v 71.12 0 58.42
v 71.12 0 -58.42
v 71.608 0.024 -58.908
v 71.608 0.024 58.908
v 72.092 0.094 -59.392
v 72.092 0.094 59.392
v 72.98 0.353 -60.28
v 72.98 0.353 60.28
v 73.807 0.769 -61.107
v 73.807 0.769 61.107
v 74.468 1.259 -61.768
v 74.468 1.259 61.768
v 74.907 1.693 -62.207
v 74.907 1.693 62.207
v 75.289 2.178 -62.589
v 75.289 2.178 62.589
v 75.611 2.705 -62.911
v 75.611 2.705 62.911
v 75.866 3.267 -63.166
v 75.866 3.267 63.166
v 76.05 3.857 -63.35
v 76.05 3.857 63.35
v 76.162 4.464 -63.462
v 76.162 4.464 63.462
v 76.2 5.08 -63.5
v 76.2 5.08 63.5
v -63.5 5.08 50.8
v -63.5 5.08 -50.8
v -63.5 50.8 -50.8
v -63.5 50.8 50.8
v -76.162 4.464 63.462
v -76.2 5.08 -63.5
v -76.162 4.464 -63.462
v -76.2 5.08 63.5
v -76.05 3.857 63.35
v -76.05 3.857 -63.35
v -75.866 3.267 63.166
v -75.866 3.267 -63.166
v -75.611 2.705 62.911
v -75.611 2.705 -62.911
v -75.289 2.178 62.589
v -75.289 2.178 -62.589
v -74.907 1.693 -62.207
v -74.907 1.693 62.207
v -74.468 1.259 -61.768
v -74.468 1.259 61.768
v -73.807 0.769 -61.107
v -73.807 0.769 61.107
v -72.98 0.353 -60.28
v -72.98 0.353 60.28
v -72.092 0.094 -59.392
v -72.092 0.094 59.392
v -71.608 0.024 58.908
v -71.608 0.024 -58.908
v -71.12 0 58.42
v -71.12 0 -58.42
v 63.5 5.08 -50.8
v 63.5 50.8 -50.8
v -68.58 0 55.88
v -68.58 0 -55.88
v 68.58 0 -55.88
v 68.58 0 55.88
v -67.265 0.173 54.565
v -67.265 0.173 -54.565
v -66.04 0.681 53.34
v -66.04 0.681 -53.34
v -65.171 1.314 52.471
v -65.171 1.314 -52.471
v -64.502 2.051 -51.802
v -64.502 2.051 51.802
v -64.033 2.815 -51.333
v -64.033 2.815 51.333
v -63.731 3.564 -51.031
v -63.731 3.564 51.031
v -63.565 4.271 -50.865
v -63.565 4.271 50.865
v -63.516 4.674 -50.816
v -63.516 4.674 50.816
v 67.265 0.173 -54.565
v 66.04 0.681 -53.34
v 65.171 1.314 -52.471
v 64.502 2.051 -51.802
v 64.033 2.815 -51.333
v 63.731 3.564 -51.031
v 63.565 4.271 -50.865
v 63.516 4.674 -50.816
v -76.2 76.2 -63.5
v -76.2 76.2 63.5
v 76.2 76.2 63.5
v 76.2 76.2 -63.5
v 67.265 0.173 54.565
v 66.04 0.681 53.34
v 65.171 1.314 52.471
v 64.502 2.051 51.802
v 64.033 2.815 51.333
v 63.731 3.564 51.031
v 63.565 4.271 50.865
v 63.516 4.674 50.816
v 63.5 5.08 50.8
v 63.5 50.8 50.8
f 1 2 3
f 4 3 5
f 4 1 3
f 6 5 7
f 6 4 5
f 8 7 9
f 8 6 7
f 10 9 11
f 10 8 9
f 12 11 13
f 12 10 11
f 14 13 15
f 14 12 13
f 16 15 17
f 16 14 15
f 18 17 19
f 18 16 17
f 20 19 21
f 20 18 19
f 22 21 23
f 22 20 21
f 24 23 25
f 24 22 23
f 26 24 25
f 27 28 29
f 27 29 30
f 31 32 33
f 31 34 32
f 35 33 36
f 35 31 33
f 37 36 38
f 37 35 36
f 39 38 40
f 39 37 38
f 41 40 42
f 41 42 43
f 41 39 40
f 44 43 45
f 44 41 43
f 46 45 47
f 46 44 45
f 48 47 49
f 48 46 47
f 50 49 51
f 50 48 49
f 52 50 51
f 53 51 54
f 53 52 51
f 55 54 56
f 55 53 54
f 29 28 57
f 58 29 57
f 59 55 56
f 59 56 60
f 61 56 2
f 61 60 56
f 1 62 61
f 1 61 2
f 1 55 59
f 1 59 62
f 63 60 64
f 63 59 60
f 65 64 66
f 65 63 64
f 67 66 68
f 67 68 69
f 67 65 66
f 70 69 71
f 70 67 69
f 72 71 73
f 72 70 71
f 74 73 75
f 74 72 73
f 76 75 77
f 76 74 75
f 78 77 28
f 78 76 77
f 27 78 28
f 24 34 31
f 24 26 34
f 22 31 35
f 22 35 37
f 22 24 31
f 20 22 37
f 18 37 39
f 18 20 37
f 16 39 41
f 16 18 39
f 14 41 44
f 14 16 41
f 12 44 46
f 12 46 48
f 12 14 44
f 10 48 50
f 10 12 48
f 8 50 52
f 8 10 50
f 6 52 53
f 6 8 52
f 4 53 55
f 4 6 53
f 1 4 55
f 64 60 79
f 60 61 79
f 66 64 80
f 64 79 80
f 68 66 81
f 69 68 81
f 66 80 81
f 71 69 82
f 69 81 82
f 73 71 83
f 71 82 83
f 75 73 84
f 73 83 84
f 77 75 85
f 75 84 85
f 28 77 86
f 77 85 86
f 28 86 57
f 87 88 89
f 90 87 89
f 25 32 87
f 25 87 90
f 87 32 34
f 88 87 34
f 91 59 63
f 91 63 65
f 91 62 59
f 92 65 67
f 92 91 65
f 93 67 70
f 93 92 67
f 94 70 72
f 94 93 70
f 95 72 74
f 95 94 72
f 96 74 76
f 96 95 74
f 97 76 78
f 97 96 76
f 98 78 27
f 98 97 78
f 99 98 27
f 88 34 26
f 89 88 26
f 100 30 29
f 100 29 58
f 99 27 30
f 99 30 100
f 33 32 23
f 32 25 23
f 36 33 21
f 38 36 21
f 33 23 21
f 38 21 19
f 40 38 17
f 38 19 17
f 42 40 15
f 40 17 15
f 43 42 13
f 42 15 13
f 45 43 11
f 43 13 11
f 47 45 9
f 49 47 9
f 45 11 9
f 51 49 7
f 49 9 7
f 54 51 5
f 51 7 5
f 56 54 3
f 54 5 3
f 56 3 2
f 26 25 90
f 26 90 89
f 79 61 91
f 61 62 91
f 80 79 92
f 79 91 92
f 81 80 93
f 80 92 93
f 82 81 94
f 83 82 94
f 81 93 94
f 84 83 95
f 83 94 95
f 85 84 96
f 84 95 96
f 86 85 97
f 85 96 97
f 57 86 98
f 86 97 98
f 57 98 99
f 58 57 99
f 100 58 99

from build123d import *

# Parameters (mm, degrees)
F0_W     = 152.4
F0_H     = 127
F1_DEPTH = 76.2
F2_W     = 127
F2_H     = 101.6
F3_DEPTH = 50.8
F4_R     = 5.08


with BuildPart() as f1:
    # F0 (on Front) → F1 (new body)
    with BuildSketch(Plane.XZ):
        Rectangle(F0_W, F0_H)
    extrude(amount=-F1_DEPTH)

    # F2 (on face) → F3 (cut)
    with BuildSketch(Plane.XZ):
        Rectangle(F2_W, F2_H)
    extrude(amount=-F3_DEPTH, mode=Mode.SUBTRACT)

    # F4
    f4_edges = [f1.edges().sort_by_distance(p)[0] for p in [
        (0, 0, 50.8),
        (0, 0, 63.5),
        (63.5, 0, 0),
        (0, 0, -50.8),
        (-63.5, 0, 0),
        (-76.2, 0, 0),
        (0, 0, -63.5),
        (76.2, 0, 0),
    ]]
    fillet(f4_edges, radius=F4_R)


solid = f1.part
